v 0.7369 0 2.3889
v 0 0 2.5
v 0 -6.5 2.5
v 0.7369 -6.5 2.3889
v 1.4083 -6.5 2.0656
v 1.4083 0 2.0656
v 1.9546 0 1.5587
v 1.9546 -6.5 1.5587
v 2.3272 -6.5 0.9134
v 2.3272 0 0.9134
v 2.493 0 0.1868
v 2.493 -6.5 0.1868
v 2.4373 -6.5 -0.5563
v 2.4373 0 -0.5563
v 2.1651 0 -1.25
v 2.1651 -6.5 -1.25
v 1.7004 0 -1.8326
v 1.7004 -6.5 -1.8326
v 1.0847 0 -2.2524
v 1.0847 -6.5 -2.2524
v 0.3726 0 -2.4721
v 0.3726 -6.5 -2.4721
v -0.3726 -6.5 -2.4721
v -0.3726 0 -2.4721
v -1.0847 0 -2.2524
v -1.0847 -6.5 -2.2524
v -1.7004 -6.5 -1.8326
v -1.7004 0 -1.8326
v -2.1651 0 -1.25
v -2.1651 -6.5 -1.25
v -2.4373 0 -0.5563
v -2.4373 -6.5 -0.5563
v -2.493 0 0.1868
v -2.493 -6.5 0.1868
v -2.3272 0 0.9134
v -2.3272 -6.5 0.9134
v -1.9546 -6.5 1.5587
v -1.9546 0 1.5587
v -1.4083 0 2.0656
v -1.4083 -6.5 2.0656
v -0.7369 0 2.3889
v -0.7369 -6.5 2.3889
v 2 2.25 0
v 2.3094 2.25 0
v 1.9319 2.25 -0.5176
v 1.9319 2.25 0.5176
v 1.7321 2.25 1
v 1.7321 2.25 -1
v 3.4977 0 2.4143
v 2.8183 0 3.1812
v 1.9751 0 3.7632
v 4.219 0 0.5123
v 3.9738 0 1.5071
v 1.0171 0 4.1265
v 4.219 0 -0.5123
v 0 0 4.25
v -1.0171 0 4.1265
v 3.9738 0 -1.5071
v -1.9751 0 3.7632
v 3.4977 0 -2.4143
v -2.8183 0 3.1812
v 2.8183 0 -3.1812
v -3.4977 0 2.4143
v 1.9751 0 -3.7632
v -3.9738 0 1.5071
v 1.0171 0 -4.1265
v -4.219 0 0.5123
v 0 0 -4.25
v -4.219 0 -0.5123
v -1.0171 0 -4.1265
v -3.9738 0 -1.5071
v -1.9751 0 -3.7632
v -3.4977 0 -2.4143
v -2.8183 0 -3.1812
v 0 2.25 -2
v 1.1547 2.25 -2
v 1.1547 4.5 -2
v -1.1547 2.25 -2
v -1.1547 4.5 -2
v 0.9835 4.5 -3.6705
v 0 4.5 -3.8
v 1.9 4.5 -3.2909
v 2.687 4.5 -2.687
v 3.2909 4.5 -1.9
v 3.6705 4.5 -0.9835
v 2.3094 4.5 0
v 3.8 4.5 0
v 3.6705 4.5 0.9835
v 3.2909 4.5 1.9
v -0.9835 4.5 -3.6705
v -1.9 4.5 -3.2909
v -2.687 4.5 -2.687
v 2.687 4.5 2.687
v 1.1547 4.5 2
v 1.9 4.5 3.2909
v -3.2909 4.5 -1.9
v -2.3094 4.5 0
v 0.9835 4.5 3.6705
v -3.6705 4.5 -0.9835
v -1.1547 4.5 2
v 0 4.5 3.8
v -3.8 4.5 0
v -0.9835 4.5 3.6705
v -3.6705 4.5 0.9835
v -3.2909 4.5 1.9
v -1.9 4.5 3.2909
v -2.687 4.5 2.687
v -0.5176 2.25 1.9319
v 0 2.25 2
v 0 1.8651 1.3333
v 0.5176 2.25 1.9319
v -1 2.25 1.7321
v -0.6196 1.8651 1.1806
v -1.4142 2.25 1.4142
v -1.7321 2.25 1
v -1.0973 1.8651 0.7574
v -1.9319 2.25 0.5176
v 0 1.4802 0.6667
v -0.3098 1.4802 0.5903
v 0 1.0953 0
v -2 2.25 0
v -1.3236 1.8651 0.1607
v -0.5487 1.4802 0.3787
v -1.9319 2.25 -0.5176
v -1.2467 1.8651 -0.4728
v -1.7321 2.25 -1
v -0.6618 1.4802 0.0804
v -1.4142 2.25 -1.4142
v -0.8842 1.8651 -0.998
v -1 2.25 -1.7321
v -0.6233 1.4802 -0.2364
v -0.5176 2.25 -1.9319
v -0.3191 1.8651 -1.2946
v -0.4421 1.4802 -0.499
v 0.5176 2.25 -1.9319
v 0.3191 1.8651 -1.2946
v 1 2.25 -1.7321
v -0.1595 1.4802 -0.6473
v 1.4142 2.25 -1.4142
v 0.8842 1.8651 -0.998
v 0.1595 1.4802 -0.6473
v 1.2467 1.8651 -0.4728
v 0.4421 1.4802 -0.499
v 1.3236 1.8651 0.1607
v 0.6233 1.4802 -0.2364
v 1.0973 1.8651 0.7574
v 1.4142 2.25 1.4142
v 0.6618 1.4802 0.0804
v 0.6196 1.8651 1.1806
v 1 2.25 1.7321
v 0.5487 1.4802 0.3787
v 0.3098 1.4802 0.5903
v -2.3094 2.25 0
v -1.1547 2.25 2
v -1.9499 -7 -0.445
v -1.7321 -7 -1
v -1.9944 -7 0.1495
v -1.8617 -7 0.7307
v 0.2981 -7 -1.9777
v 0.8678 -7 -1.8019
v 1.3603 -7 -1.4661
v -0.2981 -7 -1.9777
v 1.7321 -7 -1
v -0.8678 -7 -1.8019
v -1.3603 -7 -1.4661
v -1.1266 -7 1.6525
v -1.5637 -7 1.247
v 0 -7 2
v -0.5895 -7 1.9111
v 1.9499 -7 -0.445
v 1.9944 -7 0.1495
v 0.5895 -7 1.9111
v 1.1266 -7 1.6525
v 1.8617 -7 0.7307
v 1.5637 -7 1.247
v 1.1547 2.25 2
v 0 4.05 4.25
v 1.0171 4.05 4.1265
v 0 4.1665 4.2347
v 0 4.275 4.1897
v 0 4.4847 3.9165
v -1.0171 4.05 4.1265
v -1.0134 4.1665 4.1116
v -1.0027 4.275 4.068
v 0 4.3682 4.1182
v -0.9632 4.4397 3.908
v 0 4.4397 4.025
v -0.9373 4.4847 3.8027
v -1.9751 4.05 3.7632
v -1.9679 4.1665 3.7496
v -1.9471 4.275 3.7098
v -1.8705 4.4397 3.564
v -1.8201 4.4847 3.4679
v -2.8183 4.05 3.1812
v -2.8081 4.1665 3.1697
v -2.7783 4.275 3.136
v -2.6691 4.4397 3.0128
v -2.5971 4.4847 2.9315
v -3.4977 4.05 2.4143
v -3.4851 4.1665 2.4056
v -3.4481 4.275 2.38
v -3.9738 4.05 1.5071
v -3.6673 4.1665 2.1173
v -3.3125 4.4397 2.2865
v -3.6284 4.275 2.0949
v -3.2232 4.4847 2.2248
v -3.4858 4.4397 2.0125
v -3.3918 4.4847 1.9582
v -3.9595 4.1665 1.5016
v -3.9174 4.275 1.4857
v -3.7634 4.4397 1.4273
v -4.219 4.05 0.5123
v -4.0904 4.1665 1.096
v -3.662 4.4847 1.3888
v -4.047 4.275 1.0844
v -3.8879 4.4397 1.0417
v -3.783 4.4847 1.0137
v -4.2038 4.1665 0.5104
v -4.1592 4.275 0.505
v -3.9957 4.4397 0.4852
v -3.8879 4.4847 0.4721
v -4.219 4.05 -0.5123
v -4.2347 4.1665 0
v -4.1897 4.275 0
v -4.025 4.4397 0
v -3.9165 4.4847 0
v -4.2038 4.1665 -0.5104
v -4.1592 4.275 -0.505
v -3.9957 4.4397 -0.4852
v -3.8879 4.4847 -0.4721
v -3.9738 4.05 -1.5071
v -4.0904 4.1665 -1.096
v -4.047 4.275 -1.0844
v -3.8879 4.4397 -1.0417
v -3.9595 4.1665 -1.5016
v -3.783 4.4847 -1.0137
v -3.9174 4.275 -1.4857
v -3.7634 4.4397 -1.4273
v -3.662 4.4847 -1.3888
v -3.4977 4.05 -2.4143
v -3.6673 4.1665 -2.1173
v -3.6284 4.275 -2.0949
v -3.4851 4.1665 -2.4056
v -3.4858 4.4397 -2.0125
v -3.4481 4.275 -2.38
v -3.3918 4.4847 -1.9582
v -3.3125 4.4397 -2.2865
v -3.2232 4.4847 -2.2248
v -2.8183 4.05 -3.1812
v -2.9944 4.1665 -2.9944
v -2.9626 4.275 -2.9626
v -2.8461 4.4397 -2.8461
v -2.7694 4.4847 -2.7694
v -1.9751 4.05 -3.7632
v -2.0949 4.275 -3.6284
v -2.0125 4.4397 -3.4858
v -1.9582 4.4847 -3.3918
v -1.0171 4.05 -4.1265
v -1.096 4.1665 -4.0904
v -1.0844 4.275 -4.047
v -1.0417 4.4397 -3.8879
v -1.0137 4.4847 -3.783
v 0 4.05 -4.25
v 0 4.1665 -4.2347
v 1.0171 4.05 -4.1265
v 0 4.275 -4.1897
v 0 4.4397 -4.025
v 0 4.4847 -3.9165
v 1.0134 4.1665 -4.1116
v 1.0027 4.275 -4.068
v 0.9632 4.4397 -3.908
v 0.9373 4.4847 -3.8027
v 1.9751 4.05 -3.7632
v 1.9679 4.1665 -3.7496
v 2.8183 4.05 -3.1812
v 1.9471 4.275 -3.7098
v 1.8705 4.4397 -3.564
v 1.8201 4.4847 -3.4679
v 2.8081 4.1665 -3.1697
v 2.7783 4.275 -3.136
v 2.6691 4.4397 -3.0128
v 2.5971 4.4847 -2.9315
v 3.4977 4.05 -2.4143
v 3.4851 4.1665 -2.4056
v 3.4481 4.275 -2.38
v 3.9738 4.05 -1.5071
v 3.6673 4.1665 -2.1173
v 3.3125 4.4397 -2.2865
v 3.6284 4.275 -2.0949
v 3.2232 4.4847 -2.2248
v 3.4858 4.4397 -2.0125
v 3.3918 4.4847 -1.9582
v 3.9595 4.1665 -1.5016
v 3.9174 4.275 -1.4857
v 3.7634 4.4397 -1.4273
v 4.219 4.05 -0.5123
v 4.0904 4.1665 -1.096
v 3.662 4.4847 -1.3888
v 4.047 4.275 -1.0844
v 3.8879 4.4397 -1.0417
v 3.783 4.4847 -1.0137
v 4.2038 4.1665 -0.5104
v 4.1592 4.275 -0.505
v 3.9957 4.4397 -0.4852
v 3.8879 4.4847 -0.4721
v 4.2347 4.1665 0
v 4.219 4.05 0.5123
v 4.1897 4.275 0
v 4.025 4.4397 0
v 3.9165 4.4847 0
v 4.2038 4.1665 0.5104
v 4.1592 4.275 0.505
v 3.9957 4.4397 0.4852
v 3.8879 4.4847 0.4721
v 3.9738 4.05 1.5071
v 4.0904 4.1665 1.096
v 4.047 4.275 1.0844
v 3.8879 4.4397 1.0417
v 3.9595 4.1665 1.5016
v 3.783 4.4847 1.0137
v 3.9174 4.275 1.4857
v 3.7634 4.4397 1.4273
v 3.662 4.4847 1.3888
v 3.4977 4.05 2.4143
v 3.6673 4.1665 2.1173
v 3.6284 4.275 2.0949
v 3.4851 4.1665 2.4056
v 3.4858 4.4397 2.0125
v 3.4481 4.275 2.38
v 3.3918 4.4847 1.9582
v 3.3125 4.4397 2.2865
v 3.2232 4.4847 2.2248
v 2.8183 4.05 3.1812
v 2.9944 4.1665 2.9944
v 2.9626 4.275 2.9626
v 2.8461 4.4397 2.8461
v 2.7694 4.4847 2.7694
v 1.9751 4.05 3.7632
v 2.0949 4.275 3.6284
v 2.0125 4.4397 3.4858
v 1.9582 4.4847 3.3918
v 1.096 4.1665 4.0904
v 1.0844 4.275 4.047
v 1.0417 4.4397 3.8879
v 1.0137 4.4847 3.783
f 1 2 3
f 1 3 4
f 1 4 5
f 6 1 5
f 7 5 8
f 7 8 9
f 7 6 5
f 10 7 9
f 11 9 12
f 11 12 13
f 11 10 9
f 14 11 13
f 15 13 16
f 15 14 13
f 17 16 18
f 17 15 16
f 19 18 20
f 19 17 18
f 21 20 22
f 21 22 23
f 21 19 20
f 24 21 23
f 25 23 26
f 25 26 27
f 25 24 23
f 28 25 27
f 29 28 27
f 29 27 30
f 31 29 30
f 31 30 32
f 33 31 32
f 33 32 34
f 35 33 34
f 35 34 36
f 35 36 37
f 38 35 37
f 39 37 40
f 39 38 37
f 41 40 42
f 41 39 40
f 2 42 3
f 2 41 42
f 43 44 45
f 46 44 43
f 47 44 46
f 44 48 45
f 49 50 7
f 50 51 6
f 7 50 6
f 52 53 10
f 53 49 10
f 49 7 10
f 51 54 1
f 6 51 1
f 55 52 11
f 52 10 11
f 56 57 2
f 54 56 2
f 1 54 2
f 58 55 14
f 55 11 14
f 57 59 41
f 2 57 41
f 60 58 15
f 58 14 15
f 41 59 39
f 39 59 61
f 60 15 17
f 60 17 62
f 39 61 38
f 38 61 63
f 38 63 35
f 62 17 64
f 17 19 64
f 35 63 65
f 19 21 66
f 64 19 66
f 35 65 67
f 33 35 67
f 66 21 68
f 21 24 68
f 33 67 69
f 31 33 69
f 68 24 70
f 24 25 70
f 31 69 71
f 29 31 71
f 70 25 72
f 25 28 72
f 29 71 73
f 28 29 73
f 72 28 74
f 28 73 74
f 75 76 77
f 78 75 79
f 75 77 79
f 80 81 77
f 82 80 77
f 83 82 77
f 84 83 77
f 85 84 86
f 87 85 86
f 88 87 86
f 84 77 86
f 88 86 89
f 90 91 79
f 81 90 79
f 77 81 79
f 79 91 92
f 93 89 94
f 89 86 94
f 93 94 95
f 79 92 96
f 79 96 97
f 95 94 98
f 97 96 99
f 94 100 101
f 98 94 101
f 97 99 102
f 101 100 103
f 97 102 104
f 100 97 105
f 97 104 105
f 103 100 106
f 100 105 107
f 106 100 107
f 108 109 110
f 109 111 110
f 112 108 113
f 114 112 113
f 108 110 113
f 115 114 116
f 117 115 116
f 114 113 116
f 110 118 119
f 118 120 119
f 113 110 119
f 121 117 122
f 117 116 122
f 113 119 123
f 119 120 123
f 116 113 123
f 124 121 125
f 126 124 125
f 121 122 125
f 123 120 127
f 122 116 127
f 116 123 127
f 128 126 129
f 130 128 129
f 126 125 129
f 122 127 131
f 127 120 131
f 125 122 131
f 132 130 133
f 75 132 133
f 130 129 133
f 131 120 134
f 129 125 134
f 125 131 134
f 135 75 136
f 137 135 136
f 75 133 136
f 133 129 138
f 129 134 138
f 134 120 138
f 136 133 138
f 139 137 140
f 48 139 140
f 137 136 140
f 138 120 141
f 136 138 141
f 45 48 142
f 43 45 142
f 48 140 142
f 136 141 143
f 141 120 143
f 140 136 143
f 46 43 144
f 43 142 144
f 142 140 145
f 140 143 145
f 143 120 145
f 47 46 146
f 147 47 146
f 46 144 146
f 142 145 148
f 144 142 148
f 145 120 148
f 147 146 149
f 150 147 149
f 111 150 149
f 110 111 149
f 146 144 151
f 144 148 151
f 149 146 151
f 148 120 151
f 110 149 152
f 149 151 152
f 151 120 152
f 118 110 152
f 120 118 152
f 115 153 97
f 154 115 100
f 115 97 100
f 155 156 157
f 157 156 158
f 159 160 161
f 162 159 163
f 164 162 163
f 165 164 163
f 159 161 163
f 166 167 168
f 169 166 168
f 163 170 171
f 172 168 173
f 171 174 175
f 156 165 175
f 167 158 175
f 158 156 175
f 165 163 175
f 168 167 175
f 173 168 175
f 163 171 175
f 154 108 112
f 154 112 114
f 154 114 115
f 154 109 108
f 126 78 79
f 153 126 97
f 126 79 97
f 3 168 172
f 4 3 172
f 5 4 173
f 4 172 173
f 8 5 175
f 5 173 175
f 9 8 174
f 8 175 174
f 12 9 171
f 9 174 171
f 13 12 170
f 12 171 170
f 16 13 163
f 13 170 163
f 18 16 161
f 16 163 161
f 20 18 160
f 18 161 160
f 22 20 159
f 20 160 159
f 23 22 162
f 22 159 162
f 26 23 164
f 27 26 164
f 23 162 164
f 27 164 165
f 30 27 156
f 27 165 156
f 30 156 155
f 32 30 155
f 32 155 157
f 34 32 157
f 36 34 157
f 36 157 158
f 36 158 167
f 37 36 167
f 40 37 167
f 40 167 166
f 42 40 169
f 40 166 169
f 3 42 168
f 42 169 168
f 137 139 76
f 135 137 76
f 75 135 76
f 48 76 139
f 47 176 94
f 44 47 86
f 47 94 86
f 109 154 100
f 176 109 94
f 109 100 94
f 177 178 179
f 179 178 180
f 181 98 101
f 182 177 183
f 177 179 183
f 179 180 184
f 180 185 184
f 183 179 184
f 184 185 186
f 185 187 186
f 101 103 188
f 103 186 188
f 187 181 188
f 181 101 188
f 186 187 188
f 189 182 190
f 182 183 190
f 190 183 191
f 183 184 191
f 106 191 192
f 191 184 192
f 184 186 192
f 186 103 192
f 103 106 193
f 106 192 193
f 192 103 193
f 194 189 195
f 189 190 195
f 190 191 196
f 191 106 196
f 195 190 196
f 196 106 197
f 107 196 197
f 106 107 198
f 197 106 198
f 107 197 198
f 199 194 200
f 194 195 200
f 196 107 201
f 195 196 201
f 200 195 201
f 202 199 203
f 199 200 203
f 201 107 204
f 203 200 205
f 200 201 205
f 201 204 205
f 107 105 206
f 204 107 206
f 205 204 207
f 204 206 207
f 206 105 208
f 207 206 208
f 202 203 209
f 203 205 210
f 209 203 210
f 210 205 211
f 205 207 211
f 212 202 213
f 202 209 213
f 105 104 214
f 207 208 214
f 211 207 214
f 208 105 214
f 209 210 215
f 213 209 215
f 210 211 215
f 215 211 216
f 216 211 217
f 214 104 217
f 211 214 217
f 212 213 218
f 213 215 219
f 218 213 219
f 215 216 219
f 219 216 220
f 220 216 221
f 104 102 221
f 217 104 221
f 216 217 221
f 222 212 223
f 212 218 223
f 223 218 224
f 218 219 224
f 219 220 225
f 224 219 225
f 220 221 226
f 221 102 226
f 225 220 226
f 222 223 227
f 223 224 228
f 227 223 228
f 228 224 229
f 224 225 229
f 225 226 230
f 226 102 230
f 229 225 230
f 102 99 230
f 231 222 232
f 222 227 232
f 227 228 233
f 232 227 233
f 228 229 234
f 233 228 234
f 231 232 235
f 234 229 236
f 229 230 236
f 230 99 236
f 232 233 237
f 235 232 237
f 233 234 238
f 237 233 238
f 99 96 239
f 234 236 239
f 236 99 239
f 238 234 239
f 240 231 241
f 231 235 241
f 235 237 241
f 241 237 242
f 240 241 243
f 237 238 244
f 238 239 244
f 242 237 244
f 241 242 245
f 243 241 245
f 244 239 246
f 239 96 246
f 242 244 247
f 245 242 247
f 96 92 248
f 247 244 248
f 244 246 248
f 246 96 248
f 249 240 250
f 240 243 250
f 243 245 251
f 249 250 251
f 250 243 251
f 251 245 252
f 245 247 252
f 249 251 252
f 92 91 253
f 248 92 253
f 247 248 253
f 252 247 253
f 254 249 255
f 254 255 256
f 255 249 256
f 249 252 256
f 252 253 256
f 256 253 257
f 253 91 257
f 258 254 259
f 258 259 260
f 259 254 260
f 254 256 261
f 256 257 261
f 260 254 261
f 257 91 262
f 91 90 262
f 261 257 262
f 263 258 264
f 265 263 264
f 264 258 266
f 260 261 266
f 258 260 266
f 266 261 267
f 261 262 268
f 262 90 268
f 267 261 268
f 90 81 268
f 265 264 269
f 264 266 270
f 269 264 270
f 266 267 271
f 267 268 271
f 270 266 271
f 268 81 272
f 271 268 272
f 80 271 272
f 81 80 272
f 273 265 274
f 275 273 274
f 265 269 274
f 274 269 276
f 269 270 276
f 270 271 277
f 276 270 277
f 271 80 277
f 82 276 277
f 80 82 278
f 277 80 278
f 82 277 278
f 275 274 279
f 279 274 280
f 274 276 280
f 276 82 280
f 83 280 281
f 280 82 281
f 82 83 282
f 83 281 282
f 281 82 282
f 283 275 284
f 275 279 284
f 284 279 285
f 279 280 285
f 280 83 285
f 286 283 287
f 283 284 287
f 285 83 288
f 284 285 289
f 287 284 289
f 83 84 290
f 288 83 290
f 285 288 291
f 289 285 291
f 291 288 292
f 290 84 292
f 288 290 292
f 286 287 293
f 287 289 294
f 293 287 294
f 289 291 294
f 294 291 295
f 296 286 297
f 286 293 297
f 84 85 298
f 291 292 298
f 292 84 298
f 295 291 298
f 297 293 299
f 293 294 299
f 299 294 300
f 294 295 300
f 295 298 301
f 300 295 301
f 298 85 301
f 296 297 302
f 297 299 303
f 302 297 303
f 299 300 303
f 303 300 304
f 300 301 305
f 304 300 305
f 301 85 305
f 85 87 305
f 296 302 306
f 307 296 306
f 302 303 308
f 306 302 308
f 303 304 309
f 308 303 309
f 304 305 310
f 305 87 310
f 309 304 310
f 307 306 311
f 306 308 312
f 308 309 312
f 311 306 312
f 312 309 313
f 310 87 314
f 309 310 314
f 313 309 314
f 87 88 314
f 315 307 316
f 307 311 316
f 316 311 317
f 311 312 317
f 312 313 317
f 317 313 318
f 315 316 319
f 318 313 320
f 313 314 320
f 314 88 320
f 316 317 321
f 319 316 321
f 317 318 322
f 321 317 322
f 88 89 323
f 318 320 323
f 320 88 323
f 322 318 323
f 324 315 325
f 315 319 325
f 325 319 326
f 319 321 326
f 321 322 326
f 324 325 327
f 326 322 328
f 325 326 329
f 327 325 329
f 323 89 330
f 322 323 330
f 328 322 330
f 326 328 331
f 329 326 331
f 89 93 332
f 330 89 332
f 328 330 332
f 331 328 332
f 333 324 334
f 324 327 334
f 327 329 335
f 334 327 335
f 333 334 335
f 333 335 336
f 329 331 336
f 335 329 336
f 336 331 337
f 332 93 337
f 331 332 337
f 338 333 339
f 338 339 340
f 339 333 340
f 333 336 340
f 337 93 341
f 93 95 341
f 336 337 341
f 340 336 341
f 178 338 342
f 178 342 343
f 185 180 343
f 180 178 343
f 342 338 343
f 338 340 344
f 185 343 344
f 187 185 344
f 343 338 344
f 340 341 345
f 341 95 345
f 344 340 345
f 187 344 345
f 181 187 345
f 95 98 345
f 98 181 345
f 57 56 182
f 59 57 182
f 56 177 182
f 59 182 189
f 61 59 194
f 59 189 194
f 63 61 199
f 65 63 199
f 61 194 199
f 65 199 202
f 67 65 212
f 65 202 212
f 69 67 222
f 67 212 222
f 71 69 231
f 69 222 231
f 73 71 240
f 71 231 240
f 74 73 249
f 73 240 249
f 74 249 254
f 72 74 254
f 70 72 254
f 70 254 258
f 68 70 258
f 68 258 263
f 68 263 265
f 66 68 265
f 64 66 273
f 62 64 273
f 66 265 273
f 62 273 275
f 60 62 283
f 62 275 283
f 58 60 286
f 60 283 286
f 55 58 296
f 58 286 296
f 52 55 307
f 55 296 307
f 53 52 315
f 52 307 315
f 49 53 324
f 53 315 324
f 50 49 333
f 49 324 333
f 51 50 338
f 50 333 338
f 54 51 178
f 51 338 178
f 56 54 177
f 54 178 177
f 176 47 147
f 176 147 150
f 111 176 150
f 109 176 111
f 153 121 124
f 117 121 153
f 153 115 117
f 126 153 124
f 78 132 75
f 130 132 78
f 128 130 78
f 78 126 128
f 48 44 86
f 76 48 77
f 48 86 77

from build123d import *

# Parameters (mm, degrees)
ESQUISSE2_R             = 2.5
BASE_EXTRUSION_DEPTH    = 7
CHANFREIN1_SIZE         = 0.5
ENL_V_MAT_EXTRU_1_DEPTH = 2.25


with BuildPart() as part:
    # Esquisse2 → Base-Extrusion (new body)
    with BuildSketch(Plane(origin=(0, 0, 0), x_dir=(1, 0, 0), z_dir=(0, 1, 0))):
        with Locations(Location((0, 0, 0), (0, 0, 270))):  # turned: the seam where the file's is
            Circle(ESQUISSE2_R)
    extrude(amount=-BASE_EXTRUSION_DEPTH)

    # Chanfrein1
    chanfrein1_edges = [part.edges().sort_by_distance(p)[0] for p in [
        (0, -7, -2.5),
    ]]
    chamfer(chanfrein1_edges, length=CHANFREIN1_SIZE)

    # Esquisse5 → Boss.-Révol.1 (revolve)
    with BuildSketch(Plane.XY, mode=Mode.PRIVATE) as boss_r_vol_1_sk:
        with BuildLine():
            Line((2, 4.5), (2, 2.25))
            Line((2, 2.25), (0, 1.095299462))
            Line((0, 1.095299462), (0, 0))
            Line((0, 0), (4.25, 0))
            Line((4.25, 0), (4.25, 4.05))
            ThreePointArc((4.25, 4.05), (4.118198052, 4.368198052), (3.8, 4.5))
            Line((3.8, 4.5), (2, 4.5))
        make_face()
    revolve(boss_r_vol_1_sk.sketch.rotate(Axis((0, 4.5, 0), (0, -1, 0)), 90), axis=Axis((0, 4.5, 0), (0, -1, 0)))  # turned: the seam where the file's is

    # Esquisse7 → Enlèv. mat.-Extru.1 (cut)
    with BuildSketch(Plane(origin=(0, 4.5, 0), x_dir=(-1, 0, 0), z_dir=(0, 1, 0))):
        Polygon((1.154700538, 2), (-1.154700538, 2), (-2.309401077, 0), (-1.154700538, -2), (1.154700538, -2), (2.309401077, 0), align=None)
    extrude(amount=-ENL_V_MAT_EXTRU_1_DEPTH, mode=Mode.SUBTRACT)


solid = part.part
